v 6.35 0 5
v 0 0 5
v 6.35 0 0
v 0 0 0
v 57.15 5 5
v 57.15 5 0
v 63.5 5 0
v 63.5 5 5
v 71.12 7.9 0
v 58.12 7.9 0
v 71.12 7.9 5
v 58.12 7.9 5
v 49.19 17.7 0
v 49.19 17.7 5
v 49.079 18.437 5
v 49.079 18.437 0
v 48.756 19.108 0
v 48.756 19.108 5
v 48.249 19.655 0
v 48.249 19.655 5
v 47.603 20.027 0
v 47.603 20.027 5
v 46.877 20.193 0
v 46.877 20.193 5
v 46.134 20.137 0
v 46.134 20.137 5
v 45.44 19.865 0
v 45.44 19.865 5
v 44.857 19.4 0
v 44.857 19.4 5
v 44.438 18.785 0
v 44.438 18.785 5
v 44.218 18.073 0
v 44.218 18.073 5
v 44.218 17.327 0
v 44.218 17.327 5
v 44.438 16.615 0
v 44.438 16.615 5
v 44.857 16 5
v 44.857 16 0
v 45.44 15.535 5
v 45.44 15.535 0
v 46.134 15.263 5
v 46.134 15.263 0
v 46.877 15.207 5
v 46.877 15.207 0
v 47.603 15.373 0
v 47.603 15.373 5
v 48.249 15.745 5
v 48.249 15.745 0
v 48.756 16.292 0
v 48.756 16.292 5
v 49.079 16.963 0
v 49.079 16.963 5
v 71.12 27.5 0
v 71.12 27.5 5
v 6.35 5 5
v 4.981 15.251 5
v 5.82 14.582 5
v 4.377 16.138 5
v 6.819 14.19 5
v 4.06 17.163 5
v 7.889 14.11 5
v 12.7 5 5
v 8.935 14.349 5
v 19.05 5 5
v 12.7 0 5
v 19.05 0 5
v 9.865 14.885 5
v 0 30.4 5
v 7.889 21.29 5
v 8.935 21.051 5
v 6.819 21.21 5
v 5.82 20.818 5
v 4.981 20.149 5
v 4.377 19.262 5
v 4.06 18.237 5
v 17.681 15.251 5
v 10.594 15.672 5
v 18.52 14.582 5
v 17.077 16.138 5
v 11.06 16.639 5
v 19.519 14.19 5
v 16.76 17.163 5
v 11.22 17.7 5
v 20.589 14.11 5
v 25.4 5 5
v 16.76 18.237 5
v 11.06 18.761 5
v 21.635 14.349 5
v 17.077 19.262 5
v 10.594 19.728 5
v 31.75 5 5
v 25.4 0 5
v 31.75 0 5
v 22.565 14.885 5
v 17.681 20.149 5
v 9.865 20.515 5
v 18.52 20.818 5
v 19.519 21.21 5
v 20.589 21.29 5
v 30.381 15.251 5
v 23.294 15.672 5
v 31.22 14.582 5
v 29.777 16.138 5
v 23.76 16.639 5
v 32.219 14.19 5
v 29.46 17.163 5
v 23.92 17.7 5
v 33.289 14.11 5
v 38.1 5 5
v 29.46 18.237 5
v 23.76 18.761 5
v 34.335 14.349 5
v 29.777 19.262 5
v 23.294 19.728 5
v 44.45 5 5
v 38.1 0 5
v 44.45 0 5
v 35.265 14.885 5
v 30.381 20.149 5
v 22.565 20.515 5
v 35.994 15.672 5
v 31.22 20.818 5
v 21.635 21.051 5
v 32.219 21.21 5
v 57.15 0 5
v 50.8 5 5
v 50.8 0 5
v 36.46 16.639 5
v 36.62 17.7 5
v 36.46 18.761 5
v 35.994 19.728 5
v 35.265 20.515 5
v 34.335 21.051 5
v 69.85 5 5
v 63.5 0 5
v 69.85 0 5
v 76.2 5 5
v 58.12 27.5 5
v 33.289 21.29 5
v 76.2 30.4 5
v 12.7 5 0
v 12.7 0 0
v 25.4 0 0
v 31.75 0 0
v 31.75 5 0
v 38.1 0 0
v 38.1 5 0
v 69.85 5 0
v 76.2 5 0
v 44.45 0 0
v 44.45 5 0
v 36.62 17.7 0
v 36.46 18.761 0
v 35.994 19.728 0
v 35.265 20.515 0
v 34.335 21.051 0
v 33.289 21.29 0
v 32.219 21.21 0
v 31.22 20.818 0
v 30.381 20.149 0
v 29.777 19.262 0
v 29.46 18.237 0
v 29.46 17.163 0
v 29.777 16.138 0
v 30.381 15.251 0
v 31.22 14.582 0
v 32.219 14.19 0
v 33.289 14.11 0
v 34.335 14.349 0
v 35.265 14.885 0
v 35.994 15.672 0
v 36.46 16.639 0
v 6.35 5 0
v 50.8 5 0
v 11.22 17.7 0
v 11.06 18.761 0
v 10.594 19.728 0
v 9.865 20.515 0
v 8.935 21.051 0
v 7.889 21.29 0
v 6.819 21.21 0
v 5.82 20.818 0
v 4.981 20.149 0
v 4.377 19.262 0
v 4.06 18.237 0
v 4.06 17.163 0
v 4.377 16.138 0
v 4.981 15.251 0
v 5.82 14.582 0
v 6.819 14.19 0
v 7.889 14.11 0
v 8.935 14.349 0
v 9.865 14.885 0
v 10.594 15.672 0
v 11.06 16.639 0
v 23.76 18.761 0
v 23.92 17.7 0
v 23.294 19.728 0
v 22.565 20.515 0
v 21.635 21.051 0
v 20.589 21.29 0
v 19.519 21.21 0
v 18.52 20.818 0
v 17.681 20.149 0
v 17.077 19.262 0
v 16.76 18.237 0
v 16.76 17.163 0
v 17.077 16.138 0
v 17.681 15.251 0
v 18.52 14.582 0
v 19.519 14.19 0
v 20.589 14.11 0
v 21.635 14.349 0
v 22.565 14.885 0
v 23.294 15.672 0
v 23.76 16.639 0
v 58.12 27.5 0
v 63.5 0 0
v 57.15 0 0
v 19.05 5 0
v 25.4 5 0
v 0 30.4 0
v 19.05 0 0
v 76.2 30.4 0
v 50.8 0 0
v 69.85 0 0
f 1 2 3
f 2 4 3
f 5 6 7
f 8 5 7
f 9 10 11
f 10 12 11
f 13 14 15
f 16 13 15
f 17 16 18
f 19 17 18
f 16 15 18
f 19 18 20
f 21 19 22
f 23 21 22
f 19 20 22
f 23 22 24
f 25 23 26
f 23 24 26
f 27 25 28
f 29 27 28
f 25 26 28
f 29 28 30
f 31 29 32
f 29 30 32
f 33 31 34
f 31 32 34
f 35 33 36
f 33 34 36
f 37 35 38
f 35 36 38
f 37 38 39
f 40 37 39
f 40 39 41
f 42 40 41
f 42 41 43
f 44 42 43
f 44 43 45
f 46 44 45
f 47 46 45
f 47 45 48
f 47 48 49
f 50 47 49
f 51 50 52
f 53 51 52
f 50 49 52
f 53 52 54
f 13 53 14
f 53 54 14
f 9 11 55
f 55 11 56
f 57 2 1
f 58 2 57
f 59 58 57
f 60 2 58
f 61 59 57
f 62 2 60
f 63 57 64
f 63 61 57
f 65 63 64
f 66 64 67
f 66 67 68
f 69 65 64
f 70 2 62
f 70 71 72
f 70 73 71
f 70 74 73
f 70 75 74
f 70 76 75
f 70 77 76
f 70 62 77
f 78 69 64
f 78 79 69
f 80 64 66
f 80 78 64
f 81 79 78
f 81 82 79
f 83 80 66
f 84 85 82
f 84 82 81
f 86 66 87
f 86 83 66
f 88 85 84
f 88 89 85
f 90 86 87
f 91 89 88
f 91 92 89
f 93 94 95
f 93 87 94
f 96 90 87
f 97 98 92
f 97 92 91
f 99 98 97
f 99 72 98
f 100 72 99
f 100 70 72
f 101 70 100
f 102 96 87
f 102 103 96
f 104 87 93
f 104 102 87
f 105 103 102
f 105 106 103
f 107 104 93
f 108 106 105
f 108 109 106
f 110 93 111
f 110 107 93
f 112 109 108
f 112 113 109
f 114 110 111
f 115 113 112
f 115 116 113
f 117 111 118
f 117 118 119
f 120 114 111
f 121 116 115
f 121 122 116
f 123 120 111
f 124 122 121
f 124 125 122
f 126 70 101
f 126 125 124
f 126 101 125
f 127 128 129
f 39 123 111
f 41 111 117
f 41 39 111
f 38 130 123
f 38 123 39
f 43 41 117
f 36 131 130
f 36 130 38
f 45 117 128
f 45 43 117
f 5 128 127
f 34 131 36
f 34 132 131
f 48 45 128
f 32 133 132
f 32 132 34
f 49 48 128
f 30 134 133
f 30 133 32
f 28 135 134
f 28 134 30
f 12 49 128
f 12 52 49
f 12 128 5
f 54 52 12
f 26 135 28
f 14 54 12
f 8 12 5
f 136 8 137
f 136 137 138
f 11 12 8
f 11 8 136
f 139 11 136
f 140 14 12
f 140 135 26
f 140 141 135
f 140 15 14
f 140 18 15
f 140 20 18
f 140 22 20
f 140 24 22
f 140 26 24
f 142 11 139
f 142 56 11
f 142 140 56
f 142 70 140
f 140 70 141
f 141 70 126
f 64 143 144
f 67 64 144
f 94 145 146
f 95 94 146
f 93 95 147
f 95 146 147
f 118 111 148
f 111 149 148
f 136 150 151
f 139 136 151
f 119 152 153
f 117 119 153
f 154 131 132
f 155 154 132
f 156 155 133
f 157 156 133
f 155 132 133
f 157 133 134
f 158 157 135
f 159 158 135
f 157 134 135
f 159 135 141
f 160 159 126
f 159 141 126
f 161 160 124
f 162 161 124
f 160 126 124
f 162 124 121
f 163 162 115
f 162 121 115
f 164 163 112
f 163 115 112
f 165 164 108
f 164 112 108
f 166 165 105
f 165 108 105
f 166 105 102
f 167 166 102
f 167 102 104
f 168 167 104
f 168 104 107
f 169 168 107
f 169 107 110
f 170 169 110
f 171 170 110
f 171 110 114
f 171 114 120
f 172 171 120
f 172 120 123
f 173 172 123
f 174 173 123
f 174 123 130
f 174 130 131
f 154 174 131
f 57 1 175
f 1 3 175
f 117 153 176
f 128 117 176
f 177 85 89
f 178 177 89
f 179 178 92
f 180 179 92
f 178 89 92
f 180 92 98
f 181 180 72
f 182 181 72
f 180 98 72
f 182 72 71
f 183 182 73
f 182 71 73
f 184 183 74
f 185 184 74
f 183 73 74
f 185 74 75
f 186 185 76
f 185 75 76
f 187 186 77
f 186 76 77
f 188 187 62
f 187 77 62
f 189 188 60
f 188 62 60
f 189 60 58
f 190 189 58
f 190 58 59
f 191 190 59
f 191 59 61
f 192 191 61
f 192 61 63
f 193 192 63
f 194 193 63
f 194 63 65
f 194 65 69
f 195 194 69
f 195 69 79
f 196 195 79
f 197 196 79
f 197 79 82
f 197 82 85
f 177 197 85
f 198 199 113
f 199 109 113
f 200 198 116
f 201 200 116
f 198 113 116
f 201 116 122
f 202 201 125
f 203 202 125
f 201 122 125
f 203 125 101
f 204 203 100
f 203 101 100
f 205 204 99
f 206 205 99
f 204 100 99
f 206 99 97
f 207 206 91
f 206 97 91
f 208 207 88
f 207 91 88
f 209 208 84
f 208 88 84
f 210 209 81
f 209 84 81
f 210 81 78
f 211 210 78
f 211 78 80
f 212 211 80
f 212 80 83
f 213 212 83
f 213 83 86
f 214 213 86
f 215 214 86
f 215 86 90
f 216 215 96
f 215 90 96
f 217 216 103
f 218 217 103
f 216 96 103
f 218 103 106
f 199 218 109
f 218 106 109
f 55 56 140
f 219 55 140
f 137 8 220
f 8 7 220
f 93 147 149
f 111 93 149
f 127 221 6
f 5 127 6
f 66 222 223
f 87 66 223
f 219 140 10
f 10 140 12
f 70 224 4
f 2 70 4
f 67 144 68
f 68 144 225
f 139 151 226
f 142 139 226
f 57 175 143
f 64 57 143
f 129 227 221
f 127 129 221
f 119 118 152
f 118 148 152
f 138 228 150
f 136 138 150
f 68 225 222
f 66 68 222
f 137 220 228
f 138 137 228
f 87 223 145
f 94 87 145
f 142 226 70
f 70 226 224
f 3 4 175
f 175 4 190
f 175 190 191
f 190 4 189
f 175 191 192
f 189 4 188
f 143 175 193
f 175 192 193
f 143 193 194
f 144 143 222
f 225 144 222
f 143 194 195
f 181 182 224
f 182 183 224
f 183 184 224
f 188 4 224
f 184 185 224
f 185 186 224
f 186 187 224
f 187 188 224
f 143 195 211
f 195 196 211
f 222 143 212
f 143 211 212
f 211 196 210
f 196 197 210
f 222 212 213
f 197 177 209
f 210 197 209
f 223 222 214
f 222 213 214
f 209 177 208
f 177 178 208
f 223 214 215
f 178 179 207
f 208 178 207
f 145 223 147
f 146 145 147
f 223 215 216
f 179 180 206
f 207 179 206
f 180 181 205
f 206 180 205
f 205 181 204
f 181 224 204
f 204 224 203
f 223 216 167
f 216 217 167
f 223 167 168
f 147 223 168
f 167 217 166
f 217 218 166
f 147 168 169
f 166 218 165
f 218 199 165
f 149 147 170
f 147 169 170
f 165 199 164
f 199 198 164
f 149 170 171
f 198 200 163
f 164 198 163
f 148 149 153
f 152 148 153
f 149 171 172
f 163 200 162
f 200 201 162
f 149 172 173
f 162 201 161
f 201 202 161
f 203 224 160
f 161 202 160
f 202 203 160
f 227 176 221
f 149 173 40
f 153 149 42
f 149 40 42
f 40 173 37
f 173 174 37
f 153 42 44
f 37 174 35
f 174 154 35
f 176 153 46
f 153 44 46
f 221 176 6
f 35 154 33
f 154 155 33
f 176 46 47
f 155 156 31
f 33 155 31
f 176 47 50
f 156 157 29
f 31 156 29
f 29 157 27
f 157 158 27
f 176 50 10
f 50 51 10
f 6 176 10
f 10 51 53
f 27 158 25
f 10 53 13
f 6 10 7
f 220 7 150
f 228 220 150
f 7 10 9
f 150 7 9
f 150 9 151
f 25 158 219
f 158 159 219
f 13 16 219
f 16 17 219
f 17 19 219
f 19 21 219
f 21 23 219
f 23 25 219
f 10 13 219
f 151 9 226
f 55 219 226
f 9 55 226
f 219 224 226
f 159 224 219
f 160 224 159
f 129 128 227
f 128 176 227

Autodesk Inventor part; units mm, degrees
ref_plane "YZ Plane" through (0, 0, 0) normal (1, 0, 0) x (0, 1, 0)
ref_plane "XZ Plane" through (0, 0, 0) normal (0, 1, 0) x (-1, 0, 0)
ref_plane "XY Plane" through (0, 0, 0) normal (0, 0, 1) x (1, 0, 0)
sketch "Sketch1" plane through (0, 0, 0) normal (0, 0, 1) x (1, 0, 0)
  line L0 (0, 0) -> (6.35, 0)
  line L1 (6.35, 0) -> (6.35, 5)
  line L2 (0, 5) -> (0, 0)
  line L3 (12.7, 0) -> (19.05, 0)
  line L4 (19.05, 0) -> (19.05, 5)
  line L5 (12.7, 5) -> (12.7, 0)
  line L6 (25.4, 0) -> (31.75, 0)
  line L7 (31.75, 0) -> (31.75, 5)
  line L8 (25.4, 5) -> (25.4, 0)
  line L9 (38.1, 0) -> (44.45, 0)
  line L10 (44.45, 0) -> (44.45, 5)
  line L11 (38.1, 5) -> (38.1, 0)
  line L12 (50.8, 0) -> (57.15, 0)
  line L13 (57.15, 0) -> (57.15, 5)
  line L14 (50.8, 5) -> (50.8, 0)
  line L15 (63.5, 0) -> (69.85, 0)
  line L16 (69.85, 0) -> (69.85, 5)
  line L17 (63.5, 5) -> (63.5, 0)
  line L18 (76.2, 5) -> (76.2, 30.4)
  line L19 (76.2, 30.4) -> (0, 30.4)
  line L20 (0, 30.4) -> (0, 5)
  line L21 (6.35, 5) -> (12.7, 5)
  line L22 (19.05, 5) -> (25.4, 5)
  line L23 (31.75, 5) -> (38.1, 5)
  line L24 (44.45, 5) -> (50.8, 5)
  line L25 (57.15, 5) -> (63.5, 5)
  line L26 (69.85, 5) -> (76.2, 5)
  dimension "d3" = 6.35
  dimension "d4" = 5
  dimension "d7" = 12.7
  dimension "d12" = 76.2
  dimension "d13" = 25.4
extrude "Extrusion1" add sketch "Sketch1" along normal blind 5
sketch "Sketch2" plane through (0, 0, 5) normal (0, 0, 1) x (1, 0, 0)
  line L0 (71.12, 27.5) -> (58.12, 27.5)
  line L1 (58.12, 27.5) -> (58.12, 7.9)
  line L2 (58.12, 7.9) -> (71.12, 7.9)
  line L3 (71.12, 7.9) -> (71.12, 27.5)
  line L4 (76.2, 17.7) -> (0.6797, 17.7)
  line L5 (76.2, 5) -> (76.2, 30.4) projected
  point P0 (0, 0)
  point P1 (71.12, 17.7)
  dimension "d16" = 13
  dimension "d17" = 19.6
  dimension "d20" = 5.08
extrude "Switch" cut sketch "Sketch2" against normal blind 5
sketch "Sketch3" plane through (0, 0, 5) normal (0, 0, 1) x (1, 0, 0)
  circle A0 centre (46.69, 17.7) radius 2.5
  line L0 (76.2, 5) -> (76.2, 30.4) construction
  line L1 (58.12, 7.9) -> (58.12, 27.5) construction
  line L2 (76.2, 17.7) -> (0, 17.7) construction
  line L3 (0, 30.4) -> (0, 0) construction
  dimension "d23" = 5
  dimension "d24" = 11.43
extrude "LED" cut sketch "Sketch3" against normal blind 5
sketch "Sketch4" plane through (0, 0, 5) normal (0, 0, 1) x (1, 0, 0)
  circle A0 centre (33.02, 17.7) radius 3.6
  line L0 (76.2, 5) -> (76.2, 30.4) construction
  line L1 (76.2, 17.7) -> (0, 17.7) construction
  circle A1 centre (20.32, 17.7) radius 3.6
  circle A2 centre (7.62, 17.7) radius 3.6
  line L2 (0, 30.4) -> (0, 0) projected
  dimension "d27" = 7.2
  dimension "d28" = 7.2
  dimension "d29" = 7.2
  dimension "d30" = 12.7
  dimension "d31" = 12.7
  dimension "d33" = 7.62
extrude "Buttons" cut sketch "Sketch4" against normal blind 5
equation "\"d4\" = hardboard_thickness"
equation "\"d14\" = hardboard_thickness"
equation "\"d21\" = hardboard_thickness"
equation "\"d25\" = hardboard_thickness"
equation "\"d34\" = hardboard_thickness"
equation "\"m3_heat_set_insert\" = 4"
equation "\"m3_clearance\" = 3.4"
equation "\"m3_heat_set_depth\" = 7"
equation "\"robot_diameter\" = 354"
equation "\"hardboard_thickness\" = 5"
properties part number "control_panel"
